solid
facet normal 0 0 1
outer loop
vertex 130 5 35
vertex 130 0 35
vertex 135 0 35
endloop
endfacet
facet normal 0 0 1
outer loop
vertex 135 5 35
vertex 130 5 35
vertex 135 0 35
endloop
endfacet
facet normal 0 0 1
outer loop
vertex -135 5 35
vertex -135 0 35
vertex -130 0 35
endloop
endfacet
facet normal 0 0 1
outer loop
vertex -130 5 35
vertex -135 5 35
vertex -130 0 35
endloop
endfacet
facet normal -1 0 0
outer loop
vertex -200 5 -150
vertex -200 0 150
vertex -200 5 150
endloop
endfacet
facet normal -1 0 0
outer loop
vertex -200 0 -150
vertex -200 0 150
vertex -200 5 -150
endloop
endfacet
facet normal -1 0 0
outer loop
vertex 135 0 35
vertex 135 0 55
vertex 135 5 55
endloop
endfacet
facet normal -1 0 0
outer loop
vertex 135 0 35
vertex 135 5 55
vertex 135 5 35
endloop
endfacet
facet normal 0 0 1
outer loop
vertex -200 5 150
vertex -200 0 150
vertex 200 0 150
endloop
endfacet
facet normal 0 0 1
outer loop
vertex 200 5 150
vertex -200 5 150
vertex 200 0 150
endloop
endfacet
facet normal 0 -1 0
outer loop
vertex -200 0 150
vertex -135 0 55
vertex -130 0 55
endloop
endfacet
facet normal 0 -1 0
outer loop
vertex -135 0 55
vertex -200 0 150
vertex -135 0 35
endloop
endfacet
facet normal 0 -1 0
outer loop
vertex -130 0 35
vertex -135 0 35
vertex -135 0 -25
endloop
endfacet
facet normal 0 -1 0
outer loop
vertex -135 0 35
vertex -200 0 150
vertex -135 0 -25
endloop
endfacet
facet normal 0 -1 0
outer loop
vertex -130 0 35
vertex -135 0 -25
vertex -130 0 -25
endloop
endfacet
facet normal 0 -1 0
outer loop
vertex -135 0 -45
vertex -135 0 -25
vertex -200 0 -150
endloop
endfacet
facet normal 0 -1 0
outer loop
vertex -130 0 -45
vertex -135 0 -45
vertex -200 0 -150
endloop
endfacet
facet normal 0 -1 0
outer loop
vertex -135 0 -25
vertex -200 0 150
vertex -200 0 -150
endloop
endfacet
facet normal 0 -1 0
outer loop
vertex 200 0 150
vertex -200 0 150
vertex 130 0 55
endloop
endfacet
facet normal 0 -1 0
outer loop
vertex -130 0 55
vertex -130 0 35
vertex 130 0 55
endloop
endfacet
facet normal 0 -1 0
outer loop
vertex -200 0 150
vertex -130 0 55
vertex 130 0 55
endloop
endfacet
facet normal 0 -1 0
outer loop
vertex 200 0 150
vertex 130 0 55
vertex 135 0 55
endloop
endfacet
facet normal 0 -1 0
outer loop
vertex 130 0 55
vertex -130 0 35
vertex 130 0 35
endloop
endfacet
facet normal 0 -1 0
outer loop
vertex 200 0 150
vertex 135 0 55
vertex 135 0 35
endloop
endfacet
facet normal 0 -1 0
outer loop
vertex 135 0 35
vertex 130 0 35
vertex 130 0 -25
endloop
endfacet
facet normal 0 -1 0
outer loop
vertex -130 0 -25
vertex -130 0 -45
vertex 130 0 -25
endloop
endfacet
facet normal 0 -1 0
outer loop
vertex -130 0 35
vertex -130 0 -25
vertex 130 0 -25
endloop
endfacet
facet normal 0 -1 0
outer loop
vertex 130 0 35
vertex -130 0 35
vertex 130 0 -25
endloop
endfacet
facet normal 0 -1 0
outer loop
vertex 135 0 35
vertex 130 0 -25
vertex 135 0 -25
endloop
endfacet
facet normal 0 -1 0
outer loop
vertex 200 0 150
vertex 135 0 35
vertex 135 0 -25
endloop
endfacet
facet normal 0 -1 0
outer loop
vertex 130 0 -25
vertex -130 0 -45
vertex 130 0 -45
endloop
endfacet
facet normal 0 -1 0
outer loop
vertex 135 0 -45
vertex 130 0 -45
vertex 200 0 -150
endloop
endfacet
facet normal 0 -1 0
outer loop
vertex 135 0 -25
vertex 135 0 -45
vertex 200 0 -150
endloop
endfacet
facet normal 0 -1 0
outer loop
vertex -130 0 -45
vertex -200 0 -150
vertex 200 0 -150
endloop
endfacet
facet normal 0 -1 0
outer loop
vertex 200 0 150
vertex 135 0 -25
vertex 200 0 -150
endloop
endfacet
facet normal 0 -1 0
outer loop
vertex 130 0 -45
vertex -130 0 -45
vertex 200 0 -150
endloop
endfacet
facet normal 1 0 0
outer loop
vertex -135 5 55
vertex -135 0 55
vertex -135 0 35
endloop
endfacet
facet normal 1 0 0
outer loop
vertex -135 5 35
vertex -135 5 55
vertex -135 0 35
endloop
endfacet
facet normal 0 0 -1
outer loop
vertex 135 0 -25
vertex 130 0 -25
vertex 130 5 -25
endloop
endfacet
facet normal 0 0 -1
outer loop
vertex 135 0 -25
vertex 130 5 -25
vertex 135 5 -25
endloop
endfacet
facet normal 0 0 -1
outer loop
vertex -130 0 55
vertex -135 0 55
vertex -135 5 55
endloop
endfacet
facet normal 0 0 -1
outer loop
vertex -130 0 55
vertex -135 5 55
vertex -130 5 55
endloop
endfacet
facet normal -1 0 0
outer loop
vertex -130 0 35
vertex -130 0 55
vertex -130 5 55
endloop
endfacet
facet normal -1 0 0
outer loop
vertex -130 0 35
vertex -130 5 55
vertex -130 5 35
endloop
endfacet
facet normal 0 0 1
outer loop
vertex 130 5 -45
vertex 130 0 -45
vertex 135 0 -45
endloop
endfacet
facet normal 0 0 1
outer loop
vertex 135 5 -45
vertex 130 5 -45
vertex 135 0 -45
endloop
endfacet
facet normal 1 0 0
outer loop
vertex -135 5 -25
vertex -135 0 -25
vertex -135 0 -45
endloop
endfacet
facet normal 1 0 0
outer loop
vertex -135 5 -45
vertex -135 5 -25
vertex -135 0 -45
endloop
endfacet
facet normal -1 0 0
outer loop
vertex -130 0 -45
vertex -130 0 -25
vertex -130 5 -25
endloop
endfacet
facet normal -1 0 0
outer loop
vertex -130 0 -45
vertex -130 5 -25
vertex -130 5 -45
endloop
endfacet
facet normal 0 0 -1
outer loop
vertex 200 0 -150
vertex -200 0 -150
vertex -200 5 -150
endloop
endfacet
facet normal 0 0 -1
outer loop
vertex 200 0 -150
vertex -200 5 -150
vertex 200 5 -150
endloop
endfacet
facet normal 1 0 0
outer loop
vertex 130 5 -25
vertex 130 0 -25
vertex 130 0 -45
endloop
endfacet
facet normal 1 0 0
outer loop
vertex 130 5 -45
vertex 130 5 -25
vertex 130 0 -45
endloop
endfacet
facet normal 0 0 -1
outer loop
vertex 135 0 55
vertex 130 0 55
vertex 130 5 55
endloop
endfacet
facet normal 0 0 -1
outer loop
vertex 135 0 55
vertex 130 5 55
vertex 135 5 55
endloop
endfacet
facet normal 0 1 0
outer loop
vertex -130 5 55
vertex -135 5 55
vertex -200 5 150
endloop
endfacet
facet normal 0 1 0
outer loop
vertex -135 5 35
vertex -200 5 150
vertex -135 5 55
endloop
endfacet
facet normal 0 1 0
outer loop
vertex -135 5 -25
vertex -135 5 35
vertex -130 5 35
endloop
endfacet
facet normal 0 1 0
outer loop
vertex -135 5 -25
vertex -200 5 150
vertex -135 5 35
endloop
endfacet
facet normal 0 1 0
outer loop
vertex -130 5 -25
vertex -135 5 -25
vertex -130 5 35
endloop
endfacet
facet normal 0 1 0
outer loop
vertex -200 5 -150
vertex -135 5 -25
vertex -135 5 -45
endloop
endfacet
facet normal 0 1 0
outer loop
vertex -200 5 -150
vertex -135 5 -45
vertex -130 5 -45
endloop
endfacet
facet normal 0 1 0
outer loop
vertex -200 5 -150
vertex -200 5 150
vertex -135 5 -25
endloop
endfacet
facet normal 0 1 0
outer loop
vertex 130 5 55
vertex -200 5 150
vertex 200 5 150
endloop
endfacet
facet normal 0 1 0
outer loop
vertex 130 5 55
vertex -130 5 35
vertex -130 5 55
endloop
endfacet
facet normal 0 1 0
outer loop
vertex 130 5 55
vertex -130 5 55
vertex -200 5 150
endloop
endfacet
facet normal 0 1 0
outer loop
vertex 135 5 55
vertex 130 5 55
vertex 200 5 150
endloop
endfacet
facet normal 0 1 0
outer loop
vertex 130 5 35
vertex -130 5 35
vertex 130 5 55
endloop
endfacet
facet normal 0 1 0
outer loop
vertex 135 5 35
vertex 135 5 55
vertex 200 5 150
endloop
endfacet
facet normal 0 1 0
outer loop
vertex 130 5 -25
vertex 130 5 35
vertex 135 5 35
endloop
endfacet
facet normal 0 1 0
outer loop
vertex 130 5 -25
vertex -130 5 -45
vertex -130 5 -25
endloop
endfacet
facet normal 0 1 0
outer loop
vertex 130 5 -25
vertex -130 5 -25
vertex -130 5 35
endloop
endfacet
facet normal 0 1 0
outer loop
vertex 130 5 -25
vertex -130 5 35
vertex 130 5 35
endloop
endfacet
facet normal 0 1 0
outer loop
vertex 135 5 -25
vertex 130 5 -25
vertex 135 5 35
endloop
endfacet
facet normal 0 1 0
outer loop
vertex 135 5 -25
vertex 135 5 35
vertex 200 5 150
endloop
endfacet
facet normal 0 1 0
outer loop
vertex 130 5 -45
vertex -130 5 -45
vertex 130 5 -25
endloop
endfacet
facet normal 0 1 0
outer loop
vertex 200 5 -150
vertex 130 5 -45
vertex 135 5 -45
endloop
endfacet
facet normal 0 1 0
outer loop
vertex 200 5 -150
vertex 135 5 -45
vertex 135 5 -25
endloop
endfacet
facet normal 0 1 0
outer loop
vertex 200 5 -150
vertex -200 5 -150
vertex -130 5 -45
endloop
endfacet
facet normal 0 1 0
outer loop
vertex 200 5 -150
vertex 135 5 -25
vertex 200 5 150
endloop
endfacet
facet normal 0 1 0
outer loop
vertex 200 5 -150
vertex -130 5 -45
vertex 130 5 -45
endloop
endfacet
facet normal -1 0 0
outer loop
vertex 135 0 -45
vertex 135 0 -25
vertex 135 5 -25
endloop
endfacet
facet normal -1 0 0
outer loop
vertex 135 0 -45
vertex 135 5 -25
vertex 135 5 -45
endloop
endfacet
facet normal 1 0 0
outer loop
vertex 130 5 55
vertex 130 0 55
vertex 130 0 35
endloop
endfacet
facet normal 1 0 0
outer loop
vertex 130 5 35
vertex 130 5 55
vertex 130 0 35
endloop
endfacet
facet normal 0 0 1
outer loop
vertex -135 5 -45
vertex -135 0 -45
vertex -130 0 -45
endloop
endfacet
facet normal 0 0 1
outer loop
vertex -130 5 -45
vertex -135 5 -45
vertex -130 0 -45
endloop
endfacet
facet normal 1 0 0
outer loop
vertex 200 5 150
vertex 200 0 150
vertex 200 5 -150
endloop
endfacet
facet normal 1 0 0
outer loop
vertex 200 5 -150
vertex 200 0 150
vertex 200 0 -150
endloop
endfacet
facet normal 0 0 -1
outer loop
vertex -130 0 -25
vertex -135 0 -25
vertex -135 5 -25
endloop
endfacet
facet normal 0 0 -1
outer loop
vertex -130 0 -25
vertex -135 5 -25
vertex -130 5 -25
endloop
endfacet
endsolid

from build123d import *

# Parameters (mm, degrees)
SKETCH_1_W      = 400
SKETCH_1_H      = 300
SKETCH_1_W_2    = 5
SKETCH_1_H_2    = 20
EXTRUDE_1_DEPTH = 5


with BuildPart() as part:
    # 草圖1 → 填料-伸長1 (new body)
    with BuildSketch(Plane(origin=(0, 0, 0), x_dir=(1, 0, 0), z_dir=(0, 1, 0))):
        Rectangle(SKETCH_1_W, SKETCH_1_H)
        with Locations((-132.5, 35)):
            Rectangle(SKETCH_1_W_2, SKETCH_1_H_2, mode=Mode.SUBTRACT)
        with Locations((-132.5, -45)):
            Rectangle(SKETCH_1_W_2, SKETCH_1_H_2, mode=Mode.SUBTRACT)
        with Locations((132.5, 35)):
            Rectangle(SKETCH_1_W_2, SKETCH_1_H_2, mode=Mode.SUBTRACT)
        with Locations((132.5, -45)):
            Rectangle(SKETCH_1_W_2, SKETCH_1_H_2, mode=Mode.SUBTRACT)
    extrude(amount=EXTRUDE_1_DEPTH)


solid = part.part
